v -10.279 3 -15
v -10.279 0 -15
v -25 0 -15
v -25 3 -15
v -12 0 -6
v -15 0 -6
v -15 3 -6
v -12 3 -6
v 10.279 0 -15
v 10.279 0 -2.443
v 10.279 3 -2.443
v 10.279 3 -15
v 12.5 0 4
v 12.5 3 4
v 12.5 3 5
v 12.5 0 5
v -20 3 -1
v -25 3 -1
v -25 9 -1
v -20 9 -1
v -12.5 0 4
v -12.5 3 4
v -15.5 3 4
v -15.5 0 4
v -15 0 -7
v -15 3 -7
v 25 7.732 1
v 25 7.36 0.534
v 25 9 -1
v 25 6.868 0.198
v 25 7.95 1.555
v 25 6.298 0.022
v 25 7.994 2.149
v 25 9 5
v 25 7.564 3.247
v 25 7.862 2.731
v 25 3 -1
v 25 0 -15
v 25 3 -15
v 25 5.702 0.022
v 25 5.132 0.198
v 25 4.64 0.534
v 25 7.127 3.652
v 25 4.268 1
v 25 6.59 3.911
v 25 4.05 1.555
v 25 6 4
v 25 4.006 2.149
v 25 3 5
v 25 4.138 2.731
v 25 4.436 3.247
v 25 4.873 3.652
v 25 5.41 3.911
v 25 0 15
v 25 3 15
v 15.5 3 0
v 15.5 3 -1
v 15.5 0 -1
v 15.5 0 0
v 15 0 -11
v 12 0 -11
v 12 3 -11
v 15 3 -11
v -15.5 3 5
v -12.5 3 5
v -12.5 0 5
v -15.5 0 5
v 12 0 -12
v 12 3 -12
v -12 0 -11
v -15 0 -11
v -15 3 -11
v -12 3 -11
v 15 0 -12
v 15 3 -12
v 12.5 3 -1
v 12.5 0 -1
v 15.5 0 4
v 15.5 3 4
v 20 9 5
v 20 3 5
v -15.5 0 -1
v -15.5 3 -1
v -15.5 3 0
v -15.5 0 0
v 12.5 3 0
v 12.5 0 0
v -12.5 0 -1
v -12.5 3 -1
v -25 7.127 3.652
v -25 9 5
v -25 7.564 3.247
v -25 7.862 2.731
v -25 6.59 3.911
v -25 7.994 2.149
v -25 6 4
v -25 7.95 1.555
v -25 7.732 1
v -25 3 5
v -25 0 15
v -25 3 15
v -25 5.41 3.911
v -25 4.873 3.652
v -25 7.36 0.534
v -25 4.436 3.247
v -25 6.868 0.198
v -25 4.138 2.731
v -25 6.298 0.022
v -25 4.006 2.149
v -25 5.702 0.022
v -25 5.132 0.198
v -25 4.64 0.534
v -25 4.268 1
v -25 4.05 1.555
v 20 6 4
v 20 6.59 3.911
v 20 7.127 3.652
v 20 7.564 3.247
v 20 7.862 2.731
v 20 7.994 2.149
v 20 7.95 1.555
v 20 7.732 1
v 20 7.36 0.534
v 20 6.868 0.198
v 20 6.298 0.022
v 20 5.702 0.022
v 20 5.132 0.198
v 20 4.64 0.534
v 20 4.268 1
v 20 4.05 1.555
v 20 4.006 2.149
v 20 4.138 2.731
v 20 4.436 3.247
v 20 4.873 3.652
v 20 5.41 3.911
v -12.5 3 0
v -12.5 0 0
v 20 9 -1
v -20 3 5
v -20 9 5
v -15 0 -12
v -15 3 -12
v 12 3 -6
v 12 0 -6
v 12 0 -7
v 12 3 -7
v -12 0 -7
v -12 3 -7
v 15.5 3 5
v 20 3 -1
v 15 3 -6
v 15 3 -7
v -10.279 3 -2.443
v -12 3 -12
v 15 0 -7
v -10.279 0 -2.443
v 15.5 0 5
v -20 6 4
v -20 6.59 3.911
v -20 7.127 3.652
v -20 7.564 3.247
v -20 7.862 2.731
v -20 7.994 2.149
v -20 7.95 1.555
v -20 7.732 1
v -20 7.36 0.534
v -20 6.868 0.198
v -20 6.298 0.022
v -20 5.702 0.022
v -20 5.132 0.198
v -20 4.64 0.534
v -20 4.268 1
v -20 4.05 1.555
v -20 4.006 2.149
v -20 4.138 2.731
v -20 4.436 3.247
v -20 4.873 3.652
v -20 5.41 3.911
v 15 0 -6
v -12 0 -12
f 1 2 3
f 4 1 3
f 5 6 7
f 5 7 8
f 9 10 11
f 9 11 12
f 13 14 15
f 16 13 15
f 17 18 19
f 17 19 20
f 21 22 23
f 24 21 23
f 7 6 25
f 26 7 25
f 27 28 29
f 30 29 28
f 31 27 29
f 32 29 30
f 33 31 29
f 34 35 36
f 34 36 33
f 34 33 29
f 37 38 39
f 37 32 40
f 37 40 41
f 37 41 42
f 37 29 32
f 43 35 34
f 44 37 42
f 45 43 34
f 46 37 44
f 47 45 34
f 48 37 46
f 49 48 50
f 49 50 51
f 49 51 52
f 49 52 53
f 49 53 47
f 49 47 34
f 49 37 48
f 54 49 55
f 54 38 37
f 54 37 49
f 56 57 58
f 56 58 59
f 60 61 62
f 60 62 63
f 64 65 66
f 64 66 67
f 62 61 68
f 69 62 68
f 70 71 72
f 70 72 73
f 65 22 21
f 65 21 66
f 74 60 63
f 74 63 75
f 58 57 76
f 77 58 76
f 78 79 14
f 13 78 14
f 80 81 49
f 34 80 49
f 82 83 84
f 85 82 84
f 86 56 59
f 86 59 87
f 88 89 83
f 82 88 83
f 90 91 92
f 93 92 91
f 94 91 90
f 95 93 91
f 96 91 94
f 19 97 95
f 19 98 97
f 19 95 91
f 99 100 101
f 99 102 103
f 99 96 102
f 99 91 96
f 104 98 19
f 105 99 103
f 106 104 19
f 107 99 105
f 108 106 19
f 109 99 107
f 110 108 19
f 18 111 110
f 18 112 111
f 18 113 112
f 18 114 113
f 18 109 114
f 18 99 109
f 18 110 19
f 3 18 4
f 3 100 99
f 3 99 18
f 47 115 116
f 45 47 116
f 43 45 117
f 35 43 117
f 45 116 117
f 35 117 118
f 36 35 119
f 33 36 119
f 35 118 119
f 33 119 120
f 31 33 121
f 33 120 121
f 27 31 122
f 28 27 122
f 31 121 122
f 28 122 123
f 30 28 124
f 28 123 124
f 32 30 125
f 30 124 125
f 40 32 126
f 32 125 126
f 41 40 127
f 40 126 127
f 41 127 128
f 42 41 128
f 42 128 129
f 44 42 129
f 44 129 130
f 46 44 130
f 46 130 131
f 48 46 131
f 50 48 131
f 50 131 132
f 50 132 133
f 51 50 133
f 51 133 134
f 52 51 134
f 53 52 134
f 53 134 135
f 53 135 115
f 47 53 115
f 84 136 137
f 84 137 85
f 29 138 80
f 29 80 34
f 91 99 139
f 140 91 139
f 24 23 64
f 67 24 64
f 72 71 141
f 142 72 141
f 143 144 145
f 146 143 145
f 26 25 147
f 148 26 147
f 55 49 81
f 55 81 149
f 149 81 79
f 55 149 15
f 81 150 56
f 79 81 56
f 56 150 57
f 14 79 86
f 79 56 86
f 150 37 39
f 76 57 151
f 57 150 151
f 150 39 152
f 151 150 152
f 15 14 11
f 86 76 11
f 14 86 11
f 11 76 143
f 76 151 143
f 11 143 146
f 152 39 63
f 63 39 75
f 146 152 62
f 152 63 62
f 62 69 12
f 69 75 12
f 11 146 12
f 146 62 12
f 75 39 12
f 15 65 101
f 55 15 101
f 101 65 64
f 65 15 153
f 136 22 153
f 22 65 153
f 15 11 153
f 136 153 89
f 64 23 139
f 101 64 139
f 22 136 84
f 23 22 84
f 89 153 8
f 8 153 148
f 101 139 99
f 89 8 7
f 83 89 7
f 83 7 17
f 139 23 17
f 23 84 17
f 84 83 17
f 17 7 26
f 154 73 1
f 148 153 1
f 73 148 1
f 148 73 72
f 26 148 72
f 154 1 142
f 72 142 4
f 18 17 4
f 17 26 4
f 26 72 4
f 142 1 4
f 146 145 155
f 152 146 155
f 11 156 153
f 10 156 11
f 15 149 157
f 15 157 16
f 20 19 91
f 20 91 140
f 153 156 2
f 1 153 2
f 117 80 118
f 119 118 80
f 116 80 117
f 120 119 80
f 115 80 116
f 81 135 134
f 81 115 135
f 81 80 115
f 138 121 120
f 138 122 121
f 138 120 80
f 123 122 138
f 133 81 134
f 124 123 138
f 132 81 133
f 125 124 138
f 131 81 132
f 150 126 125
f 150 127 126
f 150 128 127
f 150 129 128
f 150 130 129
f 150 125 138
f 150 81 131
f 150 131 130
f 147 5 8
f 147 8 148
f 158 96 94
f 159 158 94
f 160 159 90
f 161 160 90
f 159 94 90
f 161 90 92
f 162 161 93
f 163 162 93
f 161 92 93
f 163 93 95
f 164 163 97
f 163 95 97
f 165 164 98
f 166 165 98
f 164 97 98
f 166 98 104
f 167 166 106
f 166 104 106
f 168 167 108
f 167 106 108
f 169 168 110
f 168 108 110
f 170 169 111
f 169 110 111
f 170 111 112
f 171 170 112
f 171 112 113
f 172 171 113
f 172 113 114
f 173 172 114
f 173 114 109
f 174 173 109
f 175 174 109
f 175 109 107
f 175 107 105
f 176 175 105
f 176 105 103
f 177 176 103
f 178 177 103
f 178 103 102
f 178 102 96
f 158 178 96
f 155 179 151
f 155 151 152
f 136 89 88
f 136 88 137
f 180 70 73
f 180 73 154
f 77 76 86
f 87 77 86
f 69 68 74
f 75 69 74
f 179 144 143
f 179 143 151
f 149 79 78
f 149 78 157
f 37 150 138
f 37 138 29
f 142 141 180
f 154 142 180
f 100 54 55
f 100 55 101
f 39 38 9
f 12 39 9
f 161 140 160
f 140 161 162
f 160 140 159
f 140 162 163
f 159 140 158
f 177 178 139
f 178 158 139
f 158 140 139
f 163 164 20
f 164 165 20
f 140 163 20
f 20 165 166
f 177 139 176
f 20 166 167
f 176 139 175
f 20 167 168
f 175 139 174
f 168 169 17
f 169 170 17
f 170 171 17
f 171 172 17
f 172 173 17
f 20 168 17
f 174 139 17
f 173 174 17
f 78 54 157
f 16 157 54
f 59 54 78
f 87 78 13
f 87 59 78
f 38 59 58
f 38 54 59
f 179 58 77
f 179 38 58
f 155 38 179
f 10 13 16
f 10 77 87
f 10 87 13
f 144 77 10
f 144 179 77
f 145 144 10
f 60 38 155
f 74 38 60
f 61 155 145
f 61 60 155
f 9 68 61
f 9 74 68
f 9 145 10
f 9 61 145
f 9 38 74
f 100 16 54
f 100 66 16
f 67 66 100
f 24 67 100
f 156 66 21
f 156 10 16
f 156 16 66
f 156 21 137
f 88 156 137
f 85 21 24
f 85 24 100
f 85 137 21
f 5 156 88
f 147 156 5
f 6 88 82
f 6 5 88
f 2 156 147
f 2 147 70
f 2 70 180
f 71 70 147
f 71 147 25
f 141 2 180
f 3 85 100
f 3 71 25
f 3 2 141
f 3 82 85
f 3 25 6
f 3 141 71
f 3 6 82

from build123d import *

# Parameters (mm, degrees)
SKETCH1_W                = 6
SKETCH1_H                = 8
BOSS_EXTRUDE1_DEPTH      = 3
SKETCH3_W                = 5
SKETCH3_H                = 6
BOSS_EXTRUDE3_DEPTH      = 6
SKETCH4_R                = 2
CUT_EXTRUDE1_DEPTH       = 53.971690553
BOSS_EXTRUDE4_DEPTH      = 6
BOSS_EXTRUDE4_DEPTH_BACK = 3
SKETCH5_W                = 6
SKETCH5_H                = 8
SKETCH6_R                = 2
CUT_EXTRUDE2_DEPTH       = 6
SKETCH7_W                = 3
SKETCH7_H                = 1
CUT_EXTRUDE3_DEPTH       = 10
CUT_EXTRUDE4_DEPTH       = 10
CUT_EXTRUDE4_DEPTH_BACK  = 10
SKETCH8_W                = 3
SKETCH8_H                = 1
SKETCH8_W_2              = 20.55867335
SKETCH8_H_2              = 13.11372747


with BuildPart() as part:
    # Sketch1 → Boss-Extrude1 (new body)
    with BuildSketch(Plane(origin=(0, 0, 0), x_dir=(1, 0, 0), z_dir=(0, 1, 0))):
        Polygon((3, 15), (25, 15), (25, -15), (-25, -15), (-25, 15), (-3, 15), align=None)
        with Locations((0, 9)):
            Rectangle(SKETCH1_W, SKETCH1_H, mode=Mode.SUBTRACT)
    extrude(amount=BOSS_EXTRUDE1_DEPTH)

    # Sketch3 → Boss-Extrude3 (add)
    with BuildSketch(Plane(origin=(0, 3, 0), x_dir=(1, 0, 0), z_dir=(0, 1, 0))):
        with Locations((-22.5, -2)):
            Rectangle(SKETCH3_W, SKETCH3_H)
        with Locations((22.5, -2)):
            Rectangle(SKETCH3_W, SKETCH3_H)
    extrude(amount=BOSS_EXTRUDE3_DEPTH)

    # Sketch4 → Cut-Extrude1 (cut, through all)
    with BuildSketch(Plane.ZY.offset(25)):
        with Locations((2, 6)):
            Circle(SKETCH4_R)
    extrude(amount=-CUT_EXTRUDE1_DEPTH, mode=Mode.SUBTRACT)

    # Sketch5 → Boss-Extrude4 (add, two sides: drawn at the far end of the back side and taken through both)
    with BuildSketch(Plane(origin=(0, 3, 0), x_dir=(-1, 0, 0), z_dir=(0, 1, 0)).offset(-BOSS_EXTRUDE4_DEPTH_BACK)):
        with Locations((0, -9)):
            Rectangle(SKETCH5_W, SKETCH5_H)
    extrude(amount=BOSS_EXTRUDE4_DEPTH + BOSS_EXTRUDE4_DEPTH_BACK)

    # Sketch6 → Cut-Extrude2 (cut)
    with BuildSketch(Plane.ZY.offset(3)):
        with Locations((-9, 6)):
            Circle(SKETCH6_R)
    extrude(amount=-CUT_EXTRUDE2_DEPTH, mode=Mode.SUBTRACT)

    # Sketch7 → Cut-Extrude3 (cut)
    with BuildSketch(Plane(origin=(0, 3, 0), x_dir=(-1, 0, 0), z_dir=(0, 1, 0))):
        with Locations((14, -0.5)):
            Rectangle(SKETCH7_W, SKETCH7_H)
        with Locations((-14, -0.5)):
            Rectangle(SKETCH7_W, SKETCH7_H)
        with Locations((-14, 4.5)):
            Rectangle(SKETCH7_W, SKETCH7_H)
        with Locations((14, 4.5)):
            Rectangle(SKETCH7_W, SKETCH7_H)
    extrude(amount=-CUT_EXTRUDE3_DEPTH, mode=Mode.SUBTRACT)

    # Sketch8 → Cut-Extrude4 (cut, two sides: drawn at the far end of the back side and taken through both)
    with BuildSketch(Plane(origin=(0, 3, 0), x_dir=(1, 0, 0), z_dir=(0, 1, 0)).offset(-CUT_EXTRUDE4_DEPTH_BACK)):
        with Locations((-13.5, 11.5)):
            Rectangle(SKETCH8_W, SKETCH8_H)
        with Locations((13.5, 11.5)):
            Rectangle(SKETCH8_W, SKETCH8_H)
        with Locations((-13.5, 6.5)):
            Rectangle(SKETCH8_W, SKETCH8_H)
        with Locations((13.5, 6.5)):
            Rectangle(SKETCH8_W, SKETCH8_H)
        with Locations((0, 9)):
            Rectangle(SKETCH8_W_2, SKETCH8_H_2)
    extrude(amount=CUT_EXTRUDE4_DEPTH + CUT_EXTRUDE4_DEPTH_BACK, mode=Mode.SUBTRACT)


solid = part.part
